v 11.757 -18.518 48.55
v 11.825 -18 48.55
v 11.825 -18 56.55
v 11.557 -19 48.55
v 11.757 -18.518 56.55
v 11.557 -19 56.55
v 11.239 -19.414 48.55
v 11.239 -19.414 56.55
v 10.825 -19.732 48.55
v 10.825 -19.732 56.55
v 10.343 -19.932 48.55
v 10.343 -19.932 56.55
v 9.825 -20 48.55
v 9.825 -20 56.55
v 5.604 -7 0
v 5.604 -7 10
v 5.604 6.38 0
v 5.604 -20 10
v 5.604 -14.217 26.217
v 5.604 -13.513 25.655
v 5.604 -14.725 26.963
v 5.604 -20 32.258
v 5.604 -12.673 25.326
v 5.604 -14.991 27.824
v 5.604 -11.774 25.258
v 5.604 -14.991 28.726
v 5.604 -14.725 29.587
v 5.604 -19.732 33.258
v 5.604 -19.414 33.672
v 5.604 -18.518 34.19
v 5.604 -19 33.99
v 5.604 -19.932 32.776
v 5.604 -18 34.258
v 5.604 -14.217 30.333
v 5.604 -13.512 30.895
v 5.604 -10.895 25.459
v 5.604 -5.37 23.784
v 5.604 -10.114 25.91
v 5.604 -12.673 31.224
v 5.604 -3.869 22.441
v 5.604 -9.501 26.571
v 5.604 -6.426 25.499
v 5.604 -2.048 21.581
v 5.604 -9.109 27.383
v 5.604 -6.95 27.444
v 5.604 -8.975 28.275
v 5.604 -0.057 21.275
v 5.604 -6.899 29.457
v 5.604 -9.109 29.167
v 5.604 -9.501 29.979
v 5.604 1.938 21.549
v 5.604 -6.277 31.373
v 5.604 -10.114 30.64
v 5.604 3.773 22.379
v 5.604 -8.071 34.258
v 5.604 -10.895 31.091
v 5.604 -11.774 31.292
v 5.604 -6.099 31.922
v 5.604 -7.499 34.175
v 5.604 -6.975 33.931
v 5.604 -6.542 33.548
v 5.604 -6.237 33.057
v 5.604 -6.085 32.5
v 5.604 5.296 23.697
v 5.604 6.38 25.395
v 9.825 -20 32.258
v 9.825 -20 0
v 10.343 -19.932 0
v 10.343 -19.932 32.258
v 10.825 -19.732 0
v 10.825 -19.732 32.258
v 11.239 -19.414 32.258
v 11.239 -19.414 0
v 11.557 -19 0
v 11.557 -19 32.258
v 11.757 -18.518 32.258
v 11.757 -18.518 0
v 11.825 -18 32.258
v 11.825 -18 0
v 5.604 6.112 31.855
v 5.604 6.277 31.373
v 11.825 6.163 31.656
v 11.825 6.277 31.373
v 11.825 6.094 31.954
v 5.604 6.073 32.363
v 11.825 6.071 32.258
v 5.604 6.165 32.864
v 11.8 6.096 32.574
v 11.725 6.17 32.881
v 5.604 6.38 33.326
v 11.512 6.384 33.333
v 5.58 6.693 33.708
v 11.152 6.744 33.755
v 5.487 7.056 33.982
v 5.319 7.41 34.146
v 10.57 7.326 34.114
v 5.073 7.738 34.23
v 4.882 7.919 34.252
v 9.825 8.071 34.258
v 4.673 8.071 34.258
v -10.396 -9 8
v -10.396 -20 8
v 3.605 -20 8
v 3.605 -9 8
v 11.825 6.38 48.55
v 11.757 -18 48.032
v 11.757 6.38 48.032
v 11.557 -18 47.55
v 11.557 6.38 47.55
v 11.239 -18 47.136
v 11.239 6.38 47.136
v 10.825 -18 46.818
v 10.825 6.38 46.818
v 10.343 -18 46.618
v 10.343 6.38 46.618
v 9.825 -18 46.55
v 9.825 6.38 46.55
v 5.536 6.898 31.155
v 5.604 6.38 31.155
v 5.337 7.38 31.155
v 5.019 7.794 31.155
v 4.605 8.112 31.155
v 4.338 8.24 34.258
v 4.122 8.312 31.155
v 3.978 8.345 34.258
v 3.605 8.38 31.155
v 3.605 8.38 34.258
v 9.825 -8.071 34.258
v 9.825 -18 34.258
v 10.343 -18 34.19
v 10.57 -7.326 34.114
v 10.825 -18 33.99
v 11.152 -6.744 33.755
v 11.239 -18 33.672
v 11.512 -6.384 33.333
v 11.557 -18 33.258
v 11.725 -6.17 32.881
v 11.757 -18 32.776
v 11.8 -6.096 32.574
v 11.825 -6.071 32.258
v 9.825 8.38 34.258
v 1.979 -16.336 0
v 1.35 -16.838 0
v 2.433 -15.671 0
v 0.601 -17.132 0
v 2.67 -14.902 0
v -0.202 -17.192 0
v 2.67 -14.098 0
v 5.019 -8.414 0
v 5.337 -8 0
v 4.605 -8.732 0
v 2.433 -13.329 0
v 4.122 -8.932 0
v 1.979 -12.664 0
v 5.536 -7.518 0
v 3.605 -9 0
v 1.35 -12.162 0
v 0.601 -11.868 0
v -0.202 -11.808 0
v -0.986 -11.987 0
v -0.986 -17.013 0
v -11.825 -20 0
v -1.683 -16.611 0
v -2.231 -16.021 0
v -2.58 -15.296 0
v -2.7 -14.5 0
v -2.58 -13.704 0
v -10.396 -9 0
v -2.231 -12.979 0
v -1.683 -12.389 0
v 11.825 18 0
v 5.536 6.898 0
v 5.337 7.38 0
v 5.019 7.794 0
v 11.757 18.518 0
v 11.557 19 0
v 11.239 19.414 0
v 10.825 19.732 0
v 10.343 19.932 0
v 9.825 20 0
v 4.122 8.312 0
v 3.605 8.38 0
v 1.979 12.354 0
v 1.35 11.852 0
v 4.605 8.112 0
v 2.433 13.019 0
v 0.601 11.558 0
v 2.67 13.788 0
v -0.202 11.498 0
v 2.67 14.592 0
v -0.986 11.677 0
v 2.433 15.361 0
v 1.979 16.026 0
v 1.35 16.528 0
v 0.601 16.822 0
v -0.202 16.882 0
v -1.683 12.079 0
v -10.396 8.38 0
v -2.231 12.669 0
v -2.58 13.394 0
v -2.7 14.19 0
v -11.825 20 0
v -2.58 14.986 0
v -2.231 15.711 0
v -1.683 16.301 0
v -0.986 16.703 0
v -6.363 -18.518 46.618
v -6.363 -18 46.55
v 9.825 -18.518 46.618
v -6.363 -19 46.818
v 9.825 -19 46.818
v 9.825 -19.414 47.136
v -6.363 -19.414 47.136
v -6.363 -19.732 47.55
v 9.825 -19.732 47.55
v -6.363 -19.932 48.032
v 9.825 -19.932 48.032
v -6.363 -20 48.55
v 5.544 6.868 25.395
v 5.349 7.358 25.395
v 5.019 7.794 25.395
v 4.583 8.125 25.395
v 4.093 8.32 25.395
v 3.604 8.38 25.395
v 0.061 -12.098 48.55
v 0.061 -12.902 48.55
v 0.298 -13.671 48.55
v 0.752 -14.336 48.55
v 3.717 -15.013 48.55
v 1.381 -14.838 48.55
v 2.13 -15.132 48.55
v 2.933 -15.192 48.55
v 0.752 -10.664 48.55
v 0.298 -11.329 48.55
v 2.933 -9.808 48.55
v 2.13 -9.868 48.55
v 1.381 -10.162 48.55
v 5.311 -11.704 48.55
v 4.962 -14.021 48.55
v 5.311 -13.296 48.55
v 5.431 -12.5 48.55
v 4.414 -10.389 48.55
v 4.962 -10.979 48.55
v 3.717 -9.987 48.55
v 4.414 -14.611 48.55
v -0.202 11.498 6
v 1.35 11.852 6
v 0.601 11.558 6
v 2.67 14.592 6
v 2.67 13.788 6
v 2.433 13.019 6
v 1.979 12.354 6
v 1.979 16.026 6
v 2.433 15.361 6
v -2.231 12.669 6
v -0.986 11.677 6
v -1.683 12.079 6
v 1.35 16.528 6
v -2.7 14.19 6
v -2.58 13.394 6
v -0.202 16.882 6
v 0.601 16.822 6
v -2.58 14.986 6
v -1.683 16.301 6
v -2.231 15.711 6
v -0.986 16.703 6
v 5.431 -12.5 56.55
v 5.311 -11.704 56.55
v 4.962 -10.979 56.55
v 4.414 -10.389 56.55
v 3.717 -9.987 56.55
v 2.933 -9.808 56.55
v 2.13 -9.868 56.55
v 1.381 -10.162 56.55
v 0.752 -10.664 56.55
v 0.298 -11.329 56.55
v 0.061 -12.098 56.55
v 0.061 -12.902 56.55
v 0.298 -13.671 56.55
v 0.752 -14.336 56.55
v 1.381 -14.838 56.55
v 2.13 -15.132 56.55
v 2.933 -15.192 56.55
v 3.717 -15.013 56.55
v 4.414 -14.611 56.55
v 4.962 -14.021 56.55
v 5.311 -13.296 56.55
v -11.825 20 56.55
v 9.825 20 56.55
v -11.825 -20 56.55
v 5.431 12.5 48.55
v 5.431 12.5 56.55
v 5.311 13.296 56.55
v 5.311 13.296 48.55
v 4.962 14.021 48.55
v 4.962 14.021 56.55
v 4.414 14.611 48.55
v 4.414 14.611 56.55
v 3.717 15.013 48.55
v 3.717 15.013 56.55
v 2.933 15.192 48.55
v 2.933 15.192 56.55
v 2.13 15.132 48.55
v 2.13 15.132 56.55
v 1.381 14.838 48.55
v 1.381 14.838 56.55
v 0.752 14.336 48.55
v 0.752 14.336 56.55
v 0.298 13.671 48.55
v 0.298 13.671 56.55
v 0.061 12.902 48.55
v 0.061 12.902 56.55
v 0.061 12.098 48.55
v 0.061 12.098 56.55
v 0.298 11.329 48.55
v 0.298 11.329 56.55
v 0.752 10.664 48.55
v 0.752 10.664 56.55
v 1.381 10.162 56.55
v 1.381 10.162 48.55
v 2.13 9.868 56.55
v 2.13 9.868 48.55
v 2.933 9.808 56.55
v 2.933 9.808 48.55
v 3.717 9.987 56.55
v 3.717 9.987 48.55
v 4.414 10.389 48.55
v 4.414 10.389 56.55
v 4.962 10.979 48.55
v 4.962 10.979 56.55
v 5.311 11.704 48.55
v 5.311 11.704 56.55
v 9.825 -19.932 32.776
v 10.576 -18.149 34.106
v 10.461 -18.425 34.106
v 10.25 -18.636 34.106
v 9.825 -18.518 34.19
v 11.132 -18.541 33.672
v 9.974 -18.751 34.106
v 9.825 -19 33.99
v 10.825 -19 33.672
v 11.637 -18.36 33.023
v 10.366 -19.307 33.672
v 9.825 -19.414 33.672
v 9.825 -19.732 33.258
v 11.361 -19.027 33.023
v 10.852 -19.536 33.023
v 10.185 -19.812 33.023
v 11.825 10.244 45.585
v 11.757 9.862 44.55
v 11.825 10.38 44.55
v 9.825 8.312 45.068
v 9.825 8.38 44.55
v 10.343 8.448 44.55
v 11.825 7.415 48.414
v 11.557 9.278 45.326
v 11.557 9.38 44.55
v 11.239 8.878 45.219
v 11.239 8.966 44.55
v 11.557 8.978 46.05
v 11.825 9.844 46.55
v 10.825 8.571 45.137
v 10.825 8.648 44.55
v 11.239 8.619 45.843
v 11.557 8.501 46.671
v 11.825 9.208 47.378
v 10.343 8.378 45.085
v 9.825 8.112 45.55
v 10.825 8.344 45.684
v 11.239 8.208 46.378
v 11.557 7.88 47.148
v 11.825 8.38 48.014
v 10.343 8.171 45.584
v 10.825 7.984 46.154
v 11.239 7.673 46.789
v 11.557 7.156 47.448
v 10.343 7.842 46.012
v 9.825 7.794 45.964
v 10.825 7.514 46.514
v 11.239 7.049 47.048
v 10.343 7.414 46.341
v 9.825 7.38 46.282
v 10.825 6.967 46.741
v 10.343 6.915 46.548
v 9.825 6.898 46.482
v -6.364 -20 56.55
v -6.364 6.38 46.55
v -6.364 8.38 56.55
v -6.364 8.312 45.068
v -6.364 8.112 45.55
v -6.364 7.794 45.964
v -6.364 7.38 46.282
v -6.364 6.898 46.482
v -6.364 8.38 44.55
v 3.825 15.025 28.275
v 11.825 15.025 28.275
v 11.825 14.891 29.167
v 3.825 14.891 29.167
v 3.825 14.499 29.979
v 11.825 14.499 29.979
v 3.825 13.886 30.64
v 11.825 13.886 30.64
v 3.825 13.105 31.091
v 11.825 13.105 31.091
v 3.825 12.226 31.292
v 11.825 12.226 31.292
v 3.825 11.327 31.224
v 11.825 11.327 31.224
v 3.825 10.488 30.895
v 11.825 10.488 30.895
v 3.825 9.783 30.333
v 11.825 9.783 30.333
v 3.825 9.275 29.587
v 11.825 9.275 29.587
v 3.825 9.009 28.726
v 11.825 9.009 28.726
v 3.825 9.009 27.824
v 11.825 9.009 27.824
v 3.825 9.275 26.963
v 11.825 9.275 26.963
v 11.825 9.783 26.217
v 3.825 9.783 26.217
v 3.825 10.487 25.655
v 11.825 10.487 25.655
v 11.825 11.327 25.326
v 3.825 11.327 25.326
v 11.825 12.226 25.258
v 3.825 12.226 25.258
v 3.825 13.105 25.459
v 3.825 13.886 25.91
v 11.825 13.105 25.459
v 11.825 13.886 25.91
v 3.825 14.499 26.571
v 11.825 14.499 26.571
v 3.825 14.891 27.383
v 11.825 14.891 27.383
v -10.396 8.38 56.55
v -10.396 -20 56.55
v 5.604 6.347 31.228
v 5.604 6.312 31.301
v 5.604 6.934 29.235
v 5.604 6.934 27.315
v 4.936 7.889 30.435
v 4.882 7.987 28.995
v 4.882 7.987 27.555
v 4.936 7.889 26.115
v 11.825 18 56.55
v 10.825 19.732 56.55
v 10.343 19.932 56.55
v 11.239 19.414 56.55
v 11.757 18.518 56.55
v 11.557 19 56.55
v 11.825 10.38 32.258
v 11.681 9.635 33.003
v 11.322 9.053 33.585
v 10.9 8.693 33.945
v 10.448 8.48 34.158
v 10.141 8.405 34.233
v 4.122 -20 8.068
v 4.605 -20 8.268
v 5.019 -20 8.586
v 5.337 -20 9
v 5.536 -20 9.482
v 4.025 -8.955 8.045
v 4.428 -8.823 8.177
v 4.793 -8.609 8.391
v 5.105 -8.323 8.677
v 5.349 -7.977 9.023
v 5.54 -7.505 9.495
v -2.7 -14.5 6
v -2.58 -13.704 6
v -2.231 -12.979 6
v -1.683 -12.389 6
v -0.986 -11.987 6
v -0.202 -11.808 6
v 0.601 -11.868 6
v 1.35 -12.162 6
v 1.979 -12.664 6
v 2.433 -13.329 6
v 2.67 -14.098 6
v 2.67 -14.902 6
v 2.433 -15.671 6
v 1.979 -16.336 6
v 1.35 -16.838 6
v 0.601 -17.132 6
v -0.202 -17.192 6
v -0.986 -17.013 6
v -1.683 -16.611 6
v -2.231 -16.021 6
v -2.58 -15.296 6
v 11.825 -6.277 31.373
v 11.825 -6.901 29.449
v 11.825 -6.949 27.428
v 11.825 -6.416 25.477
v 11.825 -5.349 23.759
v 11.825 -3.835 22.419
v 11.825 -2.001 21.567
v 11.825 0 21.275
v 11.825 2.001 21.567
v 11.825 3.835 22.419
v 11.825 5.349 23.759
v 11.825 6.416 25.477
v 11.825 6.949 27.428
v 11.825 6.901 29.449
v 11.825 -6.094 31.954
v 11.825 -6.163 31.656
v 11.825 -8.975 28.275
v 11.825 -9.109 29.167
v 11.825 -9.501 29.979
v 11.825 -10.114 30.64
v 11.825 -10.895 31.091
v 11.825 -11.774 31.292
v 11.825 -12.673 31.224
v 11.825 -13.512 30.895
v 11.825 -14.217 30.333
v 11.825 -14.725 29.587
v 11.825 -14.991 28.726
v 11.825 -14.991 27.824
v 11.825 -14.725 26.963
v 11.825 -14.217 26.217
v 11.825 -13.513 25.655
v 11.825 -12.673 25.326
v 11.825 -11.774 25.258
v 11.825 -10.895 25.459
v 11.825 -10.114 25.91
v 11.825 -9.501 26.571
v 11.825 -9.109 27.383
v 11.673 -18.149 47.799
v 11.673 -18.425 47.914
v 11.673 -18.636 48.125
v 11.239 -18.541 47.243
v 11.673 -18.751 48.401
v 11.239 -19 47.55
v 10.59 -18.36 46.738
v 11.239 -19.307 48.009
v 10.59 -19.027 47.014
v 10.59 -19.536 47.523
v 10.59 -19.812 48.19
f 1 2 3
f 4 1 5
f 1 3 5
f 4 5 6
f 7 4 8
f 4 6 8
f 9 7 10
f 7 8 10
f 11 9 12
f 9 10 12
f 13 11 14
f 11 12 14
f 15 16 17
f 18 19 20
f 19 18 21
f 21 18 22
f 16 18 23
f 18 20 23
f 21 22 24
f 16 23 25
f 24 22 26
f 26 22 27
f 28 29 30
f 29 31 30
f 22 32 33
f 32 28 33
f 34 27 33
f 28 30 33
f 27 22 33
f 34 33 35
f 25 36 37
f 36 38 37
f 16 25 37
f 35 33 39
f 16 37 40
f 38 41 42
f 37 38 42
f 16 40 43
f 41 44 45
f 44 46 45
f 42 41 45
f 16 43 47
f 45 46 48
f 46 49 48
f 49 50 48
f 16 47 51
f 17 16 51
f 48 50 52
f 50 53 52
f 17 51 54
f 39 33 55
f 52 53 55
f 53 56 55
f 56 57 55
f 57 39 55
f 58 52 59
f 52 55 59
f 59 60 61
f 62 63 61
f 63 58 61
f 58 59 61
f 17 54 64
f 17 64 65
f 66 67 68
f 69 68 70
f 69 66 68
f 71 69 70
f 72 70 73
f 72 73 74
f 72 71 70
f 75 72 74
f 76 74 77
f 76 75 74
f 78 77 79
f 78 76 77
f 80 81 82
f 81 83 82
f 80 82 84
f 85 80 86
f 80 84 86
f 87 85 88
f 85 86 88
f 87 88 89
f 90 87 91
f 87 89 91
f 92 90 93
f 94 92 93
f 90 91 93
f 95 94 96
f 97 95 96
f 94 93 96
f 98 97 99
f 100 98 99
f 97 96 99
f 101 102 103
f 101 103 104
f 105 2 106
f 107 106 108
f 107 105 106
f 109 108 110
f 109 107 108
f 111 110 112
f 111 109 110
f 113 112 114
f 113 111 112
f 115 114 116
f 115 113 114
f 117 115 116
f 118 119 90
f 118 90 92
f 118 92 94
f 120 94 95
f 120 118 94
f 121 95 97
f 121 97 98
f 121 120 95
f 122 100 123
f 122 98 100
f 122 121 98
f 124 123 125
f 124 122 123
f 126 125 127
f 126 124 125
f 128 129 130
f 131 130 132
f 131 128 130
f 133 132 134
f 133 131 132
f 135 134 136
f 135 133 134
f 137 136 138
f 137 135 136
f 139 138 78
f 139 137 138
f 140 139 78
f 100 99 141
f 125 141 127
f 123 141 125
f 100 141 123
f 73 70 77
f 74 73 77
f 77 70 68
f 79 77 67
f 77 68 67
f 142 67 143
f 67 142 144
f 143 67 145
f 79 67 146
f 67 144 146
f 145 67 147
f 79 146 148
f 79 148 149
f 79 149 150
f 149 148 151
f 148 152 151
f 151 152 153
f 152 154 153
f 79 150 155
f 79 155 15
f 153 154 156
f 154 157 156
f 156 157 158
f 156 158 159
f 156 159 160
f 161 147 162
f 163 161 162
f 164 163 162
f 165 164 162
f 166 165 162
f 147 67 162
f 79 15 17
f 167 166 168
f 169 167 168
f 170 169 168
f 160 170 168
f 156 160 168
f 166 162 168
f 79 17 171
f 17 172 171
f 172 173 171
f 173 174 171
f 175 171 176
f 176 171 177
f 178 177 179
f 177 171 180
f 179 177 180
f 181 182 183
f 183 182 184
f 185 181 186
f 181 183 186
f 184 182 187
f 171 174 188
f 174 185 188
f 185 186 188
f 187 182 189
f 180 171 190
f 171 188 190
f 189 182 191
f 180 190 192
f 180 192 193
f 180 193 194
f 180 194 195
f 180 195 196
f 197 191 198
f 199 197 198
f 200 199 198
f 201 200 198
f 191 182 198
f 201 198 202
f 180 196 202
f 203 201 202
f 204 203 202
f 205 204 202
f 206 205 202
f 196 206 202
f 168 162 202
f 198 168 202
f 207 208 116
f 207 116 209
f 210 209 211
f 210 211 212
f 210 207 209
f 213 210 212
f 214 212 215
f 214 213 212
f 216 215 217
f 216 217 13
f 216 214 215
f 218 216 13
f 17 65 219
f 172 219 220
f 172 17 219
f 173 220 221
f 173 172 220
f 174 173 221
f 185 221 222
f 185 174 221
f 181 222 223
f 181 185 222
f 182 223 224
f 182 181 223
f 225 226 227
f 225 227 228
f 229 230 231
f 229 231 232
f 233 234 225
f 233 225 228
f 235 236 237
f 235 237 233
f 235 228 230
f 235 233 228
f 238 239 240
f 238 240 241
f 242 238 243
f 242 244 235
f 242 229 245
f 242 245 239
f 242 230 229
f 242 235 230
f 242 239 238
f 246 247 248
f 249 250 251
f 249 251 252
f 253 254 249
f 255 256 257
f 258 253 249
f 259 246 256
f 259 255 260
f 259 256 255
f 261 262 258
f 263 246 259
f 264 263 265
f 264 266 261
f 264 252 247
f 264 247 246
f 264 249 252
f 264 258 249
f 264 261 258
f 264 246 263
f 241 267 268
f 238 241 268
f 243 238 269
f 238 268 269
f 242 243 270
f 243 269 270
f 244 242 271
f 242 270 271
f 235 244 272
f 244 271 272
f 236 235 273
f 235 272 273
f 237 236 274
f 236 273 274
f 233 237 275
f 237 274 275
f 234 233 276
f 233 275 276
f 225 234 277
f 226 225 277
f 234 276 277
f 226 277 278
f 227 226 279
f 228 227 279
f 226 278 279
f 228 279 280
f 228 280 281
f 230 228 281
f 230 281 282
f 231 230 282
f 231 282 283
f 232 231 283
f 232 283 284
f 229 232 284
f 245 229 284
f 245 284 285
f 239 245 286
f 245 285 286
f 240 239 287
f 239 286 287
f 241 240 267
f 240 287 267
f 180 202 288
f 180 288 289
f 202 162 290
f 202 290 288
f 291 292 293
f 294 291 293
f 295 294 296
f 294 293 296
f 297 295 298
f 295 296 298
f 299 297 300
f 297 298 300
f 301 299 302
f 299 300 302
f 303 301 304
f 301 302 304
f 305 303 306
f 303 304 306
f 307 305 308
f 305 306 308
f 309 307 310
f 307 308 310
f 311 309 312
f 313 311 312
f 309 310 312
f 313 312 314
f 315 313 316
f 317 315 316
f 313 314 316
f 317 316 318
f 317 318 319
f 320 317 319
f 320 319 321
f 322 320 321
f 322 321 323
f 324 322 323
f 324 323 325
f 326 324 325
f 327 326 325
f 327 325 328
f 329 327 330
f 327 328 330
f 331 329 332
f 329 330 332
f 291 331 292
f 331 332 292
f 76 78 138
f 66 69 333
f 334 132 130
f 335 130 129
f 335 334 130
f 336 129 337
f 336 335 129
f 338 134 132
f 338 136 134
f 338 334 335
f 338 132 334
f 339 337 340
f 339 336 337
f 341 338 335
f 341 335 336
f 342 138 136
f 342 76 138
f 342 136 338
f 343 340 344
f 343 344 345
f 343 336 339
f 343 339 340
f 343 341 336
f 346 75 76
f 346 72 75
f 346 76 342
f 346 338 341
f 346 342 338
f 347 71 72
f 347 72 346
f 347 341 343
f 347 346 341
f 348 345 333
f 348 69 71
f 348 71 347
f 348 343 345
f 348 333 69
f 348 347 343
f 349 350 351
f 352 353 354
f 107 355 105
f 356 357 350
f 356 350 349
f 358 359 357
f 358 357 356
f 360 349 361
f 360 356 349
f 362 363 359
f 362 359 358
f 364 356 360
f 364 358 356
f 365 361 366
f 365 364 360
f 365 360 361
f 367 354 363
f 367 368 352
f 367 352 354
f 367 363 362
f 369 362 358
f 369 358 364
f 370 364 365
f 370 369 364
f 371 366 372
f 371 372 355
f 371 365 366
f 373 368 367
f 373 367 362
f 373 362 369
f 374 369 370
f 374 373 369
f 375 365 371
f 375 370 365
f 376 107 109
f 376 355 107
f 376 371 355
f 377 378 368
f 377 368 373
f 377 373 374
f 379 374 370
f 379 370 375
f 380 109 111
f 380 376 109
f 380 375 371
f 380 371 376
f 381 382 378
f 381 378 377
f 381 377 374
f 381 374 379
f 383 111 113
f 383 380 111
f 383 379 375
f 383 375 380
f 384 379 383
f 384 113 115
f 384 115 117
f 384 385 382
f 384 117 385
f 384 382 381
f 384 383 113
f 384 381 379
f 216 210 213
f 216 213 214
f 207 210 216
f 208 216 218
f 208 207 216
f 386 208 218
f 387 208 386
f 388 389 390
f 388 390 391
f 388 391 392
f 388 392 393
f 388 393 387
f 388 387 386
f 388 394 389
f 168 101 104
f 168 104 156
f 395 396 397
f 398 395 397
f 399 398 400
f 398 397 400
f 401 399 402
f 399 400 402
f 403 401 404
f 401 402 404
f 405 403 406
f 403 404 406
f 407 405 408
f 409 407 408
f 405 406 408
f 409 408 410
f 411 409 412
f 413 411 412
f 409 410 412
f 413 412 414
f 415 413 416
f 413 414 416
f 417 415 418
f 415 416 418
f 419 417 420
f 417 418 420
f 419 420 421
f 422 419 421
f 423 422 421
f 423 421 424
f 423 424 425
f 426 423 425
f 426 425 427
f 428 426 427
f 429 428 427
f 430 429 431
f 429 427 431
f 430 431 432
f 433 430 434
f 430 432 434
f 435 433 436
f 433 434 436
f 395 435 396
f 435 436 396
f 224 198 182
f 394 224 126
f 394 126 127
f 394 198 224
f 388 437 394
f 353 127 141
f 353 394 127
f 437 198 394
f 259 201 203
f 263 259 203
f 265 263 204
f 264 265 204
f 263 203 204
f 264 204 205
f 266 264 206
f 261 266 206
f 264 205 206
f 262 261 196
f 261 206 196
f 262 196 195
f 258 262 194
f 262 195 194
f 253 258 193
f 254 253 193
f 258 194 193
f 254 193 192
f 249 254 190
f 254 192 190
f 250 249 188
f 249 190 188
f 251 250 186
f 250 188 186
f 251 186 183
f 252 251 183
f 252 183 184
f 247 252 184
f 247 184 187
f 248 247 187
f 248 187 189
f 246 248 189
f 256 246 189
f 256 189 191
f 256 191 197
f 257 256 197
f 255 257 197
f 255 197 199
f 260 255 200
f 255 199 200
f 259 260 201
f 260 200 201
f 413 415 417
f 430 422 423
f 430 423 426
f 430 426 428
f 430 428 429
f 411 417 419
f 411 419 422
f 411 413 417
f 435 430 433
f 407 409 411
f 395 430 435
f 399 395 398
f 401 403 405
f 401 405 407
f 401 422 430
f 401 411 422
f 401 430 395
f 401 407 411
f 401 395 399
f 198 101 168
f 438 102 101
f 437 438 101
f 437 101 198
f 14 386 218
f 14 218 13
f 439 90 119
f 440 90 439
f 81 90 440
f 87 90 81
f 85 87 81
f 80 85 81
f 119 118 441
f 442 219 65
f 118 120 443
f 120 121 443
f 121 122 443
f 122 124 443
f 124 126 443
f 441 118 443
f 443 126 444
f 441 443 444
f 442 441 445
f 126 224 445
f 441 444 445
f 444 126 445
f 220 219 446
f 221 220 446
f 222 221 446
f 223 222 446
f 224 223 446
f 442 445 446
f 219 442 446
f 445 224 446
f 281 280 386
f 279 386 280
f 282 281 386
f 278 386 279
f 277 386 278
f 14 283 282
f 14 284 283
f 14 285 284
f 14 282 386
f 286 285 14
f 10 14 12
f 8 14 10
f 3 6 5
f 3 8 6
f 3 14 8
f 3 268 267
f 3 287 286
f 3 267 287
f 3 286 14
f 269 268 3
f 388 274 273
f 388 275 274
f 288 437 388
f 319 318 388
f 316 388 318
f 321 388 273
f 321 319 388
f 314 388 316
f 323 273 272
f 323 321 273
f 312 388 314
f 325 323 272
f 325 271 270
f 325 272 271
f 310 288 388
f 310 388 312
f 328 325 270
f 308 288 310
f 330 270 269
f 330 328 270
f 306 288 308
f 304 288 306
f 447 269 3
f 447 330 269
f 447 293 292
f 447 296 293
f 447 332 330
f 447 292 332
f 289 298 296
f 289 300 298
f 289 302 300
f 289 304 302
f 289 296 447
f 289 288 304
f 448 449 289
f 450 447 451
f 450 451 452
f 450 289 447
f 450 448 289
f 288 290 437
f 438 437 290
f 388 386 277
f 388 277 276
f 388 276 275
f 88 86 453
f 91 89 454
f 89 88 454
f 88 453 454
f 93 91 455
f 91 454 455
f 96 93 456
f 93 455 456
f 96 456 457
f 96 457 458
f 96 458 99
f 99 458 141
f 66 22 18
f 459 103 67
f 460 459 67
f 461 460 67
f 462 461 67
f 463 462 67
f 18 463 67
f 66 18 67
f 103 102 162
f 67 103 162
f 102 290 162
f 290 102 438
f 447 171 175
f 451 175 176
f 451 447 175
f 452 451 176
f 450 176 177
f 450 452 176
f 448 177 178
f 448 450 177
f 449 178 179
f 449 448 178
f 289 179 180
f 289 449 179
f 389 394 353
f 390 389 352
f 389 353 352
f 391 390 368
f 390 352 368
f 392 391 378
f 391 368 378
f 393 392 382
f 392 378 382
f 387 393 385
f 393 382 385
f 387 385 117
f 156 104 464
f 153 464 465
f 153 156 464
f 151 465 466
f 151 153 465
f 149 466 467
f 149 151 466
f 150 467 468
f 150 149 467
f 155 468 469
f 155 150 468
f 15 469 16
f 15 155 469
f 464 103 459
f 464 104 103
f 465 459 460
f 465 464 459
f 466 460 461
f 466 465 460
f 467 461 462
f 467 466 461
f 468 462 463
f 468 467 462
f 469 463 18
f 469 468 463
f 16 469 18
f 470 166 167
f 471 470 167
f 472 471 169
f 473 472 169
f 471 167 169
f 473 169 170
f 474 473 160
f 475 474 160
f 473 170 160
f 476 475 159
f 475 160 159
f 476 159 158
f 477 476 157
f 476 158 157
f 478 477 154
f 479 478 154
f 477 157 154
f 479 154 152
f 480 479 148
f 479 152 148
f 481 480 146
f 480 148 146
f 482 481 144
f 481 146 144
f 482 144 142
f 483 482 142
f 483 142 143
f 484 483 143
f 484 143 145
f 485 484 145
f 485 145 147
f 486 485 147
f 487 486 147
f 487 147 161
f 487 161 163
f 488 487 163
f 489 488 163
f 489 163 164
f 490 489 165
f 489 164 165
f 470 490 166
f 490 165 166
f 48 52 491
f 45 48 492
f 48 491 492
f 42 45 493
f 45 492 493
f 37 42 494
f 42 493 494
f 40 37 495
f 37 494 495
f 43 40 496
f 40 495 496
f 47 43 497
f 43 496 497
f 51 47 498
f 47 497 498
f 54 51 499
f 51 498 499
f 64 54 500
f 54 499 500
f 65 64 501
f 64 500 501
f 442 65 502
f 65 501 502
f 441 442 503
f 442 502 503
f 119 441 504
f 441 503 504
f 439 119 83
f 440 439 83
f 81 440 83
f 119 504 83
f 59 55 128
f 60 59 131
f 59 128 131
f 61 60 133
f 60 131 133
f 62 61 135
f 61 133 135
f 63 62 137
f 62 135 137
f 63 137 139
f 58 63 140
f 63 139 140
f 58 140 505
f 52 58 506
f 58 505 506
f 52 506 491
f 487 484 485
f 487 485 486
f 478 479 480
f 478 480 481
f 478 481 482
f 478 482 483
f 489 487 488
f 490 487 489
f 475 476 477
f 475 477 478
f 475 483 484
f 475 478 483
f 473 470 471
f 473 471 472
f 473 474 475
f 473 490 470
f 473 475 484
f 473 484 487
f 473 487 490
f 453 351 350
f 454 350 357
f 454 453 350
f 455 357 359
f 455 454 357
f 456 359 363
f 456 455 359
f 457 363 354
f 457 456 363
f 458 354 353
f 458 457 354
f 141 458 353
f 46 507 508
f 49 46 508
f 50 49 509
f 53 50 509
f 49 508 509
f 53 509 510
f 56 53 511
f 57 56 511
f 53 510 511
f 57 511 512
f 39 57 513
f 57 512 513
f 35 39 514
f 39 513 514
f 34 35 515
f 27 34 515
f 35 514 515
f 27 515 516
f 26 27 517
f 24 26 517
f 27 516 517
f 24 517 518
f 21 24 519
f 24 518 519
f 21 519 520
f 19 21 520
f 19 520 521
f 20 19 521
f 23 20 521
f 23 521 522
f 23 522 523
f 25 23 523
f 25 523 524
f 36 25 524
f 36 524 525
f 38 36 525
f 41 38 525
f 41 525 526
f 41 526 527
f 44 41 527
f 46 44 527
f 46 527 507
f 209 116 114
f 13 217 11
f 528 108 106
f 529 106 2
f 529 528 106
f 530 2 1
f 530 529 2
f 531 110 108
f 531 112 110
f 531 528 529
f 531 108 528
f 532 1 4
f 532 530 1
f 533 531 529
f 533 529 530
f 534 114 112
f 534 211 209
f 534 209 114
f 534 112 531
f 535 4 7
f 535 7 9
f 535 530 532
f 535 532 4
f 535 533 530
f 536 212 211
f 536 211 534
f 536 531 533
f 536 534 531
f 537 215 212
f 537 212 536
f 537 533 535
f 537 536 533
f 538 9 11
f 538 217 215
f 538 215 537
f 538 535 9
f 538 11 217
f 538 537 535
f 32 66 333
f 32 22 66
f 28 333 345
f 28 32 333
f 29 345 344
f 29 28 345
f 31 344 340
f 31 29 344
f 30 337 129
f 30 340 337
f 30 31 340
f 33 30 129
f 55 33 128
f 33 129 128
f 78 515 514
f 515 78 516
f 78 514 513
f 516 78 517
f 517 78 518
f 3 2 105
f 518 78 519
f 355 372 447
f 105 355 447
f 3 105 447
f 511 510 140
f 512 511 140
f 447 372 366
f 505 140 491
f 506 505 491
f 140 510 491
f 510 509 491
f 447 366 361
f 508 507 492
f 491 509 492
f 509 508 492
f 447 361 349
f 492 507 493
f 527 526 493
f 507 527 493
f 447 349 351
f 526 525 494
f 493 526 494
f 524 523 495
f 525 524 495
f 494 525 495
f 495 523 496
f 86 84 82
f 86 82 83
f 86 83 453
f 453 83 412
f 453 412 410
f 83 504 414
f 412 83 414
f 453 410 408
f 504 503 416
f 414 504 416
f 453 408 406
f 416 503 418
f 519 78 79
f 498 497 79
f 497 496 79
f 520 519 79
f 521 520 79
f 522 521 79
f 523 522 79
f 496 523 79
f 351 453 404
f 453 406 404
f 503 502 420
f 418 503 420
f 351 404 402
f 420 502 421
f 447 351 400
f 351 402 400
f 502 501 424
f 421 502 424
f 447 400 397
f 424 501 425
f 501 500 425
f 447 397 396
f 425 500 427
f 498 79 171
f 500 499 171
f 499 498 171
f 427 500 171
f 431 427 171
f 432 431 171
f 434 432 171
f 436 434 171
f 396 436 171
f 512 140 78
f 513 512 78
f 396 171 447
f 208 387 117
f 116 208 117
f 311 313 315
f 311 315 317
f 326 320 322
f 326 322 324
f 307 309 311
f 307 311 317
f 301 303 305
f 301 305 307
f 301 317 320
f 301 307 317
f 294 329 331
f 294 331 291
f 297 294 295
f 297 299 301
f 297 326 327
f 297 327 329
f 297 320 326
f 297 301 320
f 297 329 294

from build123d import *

# Parameters (mm, degrees)
SKETCH1_W           = 23.65
SKETCH1_H           = 40
BOSS_EXTRUDE1_DEPTH = 56.55
SKETCH2_W           = 16
SKETCH2_H           = 28.38
CUT_EXTRUDE1_DEPTH  = 62.137002911
SKETCH3_R           = 7
CUT_EXTRUDE2_DEPTH  = 6.2205
SKETCH6_R           = 3.025
CUT_EXTRUDE4_DEPTH  = 8
SKETCH4_W           = 11.968
SKETCH4_H           = 10
BOSS_EXTRUDE2_DEPTH = 28.38
SKETCH5_W           = 12.292
SKETCH5_H           = 28.38
CUT_EXTRUDE3_DEPTH  = 6.2205
FILLET5_R           = 2
SKETCH9_W           = 8
SKETCH9_H           = 11
BOSS_EXTRUDE3_DEPTH = 16
SKETCH8_R           = 2.7
CUT_EXTRUDE6_DEPTH  = 6
SKETCH7_R           = 2.7
CUT_EXTRUDE5_DEPTH  = 8
FILLET4_R           = 2


with BuildPart() as part:
    # Sketch1 → Boss-Extrude1 (new body)
    with BuildSketch(Plane.XY):
        Rectangle(SKETCH1_W, SKETCH1_H)
    extrude(amount=BOSS_EXTRUDE1_DEPTH)

    # Sketch2 → Cut-Extrude1 (cut, through all)
    with BuildSketch(Plane.XY.offset(56.55)):
        with Locations((-2.3955, -5.81)):
            Rectangle(SKETCH2_W, SKETCH2_H)
    extrude(amount=-CUT_EXTRUDE1_DEPTH, mode=Mode.SUBTRACT)

    # Sketch3 → Cut-Extrude2 (cut)
    with BuildSketch(Plane(origin=(11.825, 0, 0), x_dir=(0, 0, -1), z_dir=(1, 0, 0))):
        with Locations(Location((-28.275, 0, 0), (0, 0, 90))):
            Circle(SKETCH3_R)
    extrude(amount=-CUT_EXTRUDE2_DEPTH, mode=Mode.SUBTRACT)

    # Sketch6 → Cut-Extrude4 (cut)
    with BuildSketch(Plane(origin=(11.825, 0, 0), x_dir=(0, 0, -1), z_dir=(1, 0, 0))):
        with Locations(Location((-28.275, 12, 0), (0, 0, 90))):
            Circle(SKETCH6_R)
        with Locations(Location((-28.275, -12, 0), (0, 0, 90))):
            Circle(SKETCH6_R)
    extrude(amount=-CUT_EXTRUDE4_DEPTH, mode=Mode.SUBTRACT)

    # Sketch4 → Boss-Extrude2 (add)
    with BuildSketch(Plane.XZ.offset(-8.38)):
        with Locations((-0.3795, 51.55)):
            Rectangle(SKETCH4_W, SKETCH4_H)
    extrude(amount=BOSS_EXTRUDE2_DEPTH)

    # Sketch5 → Cut-Extrude3 (cut)
    with BuildSketch(Plane(origin=(11.825, 0, 0), x_dir=(0, 0, -1), z_dir=(1, 0, 0))):
        with Locations((-40.404, -5.81)):
            Rectangle(SKETCH5_W, SKETCH5_H)
    extrude(amount=-CUT_EXTRUDE3_DEPTH, mode=Mode.SUBTRACT)

    # Fillet5
    fillet5_edges = [part.edges().sort_by_distance(p)[0] for p in [
        (5.6045, 8.38, 17.129),
    ]]
    fillet(fillet5_edges, radius=FILLET5_R)

    # Sketch9 → Boss-Extrude3 (add)
    with BuildSketch(Plane(origin=(-10.3955, 0, 0), x_dir=(0, 0, -1), z_dir=(1, 0, 0))):
        with Locations((-4, -14.5)):
            Rectangle(SKETCH9_W, SKETCH9_H)
    extrude(amount=BOSS_EXTRUDE3_DEPTH)

    # Sketch8 → Cut-Extrude6 (cut)
    with BuildSketch(Plane(origin=(0, 0, 0), x_dir=(-1, 0, 0), z_dir=(0, 0, -1))):
        with Locations((0, 14.19)):
            Circle(SKETCH8_R)
        with Locations((0, -14.5)):
            Circle(SKETCH8_R)
    extrude(amount=-CUT_EXTRUDE6_DEPTH, mode=Mode.SUBTRACT)

    # Sketch7 → Cut-Extrude5 (cut)
    with BuildSketch(Plane.XY.offset(56.55)):
        with Locations((2.73075, 12.5)):
            Circle(SKETCH7_R)
        with Locations((2.73075, -12.5)):
            Circle(SKETCH7_R)
    extrude(amount=-CUT_EXTRUDE5_DEPTH, mode=Mode.SUBTRACT)

    # Fillet4
    fillet4_edges = [part.edges().sort_by_distance(p)[0] for p in [
        (5.6045, -14.5, 8),
        (5.6045, -9, 4),
        (2.73075, -20, 46.55),
        (2.73075, 8.38, 46.55),
        (8.71475, 3.633691099, 34.258),
        (8.71475, -3.633691099, 34.258),
        (11.825, -20, 17.129),
        (11.825, 8.38, 40.404),
        (11.825, -11.816845549, 34.258),
        (11.825, 6.006845549, 34.258),
        (11.825, -5.81, 46.55),
        (8.71475, -20, 34.258),
        (11.825, -20, 51.55),
        (11.825, 20, 28.275),
    ]]
    fillet(fillet4_edges, radius=FILLET4_R)


solid = part.part
